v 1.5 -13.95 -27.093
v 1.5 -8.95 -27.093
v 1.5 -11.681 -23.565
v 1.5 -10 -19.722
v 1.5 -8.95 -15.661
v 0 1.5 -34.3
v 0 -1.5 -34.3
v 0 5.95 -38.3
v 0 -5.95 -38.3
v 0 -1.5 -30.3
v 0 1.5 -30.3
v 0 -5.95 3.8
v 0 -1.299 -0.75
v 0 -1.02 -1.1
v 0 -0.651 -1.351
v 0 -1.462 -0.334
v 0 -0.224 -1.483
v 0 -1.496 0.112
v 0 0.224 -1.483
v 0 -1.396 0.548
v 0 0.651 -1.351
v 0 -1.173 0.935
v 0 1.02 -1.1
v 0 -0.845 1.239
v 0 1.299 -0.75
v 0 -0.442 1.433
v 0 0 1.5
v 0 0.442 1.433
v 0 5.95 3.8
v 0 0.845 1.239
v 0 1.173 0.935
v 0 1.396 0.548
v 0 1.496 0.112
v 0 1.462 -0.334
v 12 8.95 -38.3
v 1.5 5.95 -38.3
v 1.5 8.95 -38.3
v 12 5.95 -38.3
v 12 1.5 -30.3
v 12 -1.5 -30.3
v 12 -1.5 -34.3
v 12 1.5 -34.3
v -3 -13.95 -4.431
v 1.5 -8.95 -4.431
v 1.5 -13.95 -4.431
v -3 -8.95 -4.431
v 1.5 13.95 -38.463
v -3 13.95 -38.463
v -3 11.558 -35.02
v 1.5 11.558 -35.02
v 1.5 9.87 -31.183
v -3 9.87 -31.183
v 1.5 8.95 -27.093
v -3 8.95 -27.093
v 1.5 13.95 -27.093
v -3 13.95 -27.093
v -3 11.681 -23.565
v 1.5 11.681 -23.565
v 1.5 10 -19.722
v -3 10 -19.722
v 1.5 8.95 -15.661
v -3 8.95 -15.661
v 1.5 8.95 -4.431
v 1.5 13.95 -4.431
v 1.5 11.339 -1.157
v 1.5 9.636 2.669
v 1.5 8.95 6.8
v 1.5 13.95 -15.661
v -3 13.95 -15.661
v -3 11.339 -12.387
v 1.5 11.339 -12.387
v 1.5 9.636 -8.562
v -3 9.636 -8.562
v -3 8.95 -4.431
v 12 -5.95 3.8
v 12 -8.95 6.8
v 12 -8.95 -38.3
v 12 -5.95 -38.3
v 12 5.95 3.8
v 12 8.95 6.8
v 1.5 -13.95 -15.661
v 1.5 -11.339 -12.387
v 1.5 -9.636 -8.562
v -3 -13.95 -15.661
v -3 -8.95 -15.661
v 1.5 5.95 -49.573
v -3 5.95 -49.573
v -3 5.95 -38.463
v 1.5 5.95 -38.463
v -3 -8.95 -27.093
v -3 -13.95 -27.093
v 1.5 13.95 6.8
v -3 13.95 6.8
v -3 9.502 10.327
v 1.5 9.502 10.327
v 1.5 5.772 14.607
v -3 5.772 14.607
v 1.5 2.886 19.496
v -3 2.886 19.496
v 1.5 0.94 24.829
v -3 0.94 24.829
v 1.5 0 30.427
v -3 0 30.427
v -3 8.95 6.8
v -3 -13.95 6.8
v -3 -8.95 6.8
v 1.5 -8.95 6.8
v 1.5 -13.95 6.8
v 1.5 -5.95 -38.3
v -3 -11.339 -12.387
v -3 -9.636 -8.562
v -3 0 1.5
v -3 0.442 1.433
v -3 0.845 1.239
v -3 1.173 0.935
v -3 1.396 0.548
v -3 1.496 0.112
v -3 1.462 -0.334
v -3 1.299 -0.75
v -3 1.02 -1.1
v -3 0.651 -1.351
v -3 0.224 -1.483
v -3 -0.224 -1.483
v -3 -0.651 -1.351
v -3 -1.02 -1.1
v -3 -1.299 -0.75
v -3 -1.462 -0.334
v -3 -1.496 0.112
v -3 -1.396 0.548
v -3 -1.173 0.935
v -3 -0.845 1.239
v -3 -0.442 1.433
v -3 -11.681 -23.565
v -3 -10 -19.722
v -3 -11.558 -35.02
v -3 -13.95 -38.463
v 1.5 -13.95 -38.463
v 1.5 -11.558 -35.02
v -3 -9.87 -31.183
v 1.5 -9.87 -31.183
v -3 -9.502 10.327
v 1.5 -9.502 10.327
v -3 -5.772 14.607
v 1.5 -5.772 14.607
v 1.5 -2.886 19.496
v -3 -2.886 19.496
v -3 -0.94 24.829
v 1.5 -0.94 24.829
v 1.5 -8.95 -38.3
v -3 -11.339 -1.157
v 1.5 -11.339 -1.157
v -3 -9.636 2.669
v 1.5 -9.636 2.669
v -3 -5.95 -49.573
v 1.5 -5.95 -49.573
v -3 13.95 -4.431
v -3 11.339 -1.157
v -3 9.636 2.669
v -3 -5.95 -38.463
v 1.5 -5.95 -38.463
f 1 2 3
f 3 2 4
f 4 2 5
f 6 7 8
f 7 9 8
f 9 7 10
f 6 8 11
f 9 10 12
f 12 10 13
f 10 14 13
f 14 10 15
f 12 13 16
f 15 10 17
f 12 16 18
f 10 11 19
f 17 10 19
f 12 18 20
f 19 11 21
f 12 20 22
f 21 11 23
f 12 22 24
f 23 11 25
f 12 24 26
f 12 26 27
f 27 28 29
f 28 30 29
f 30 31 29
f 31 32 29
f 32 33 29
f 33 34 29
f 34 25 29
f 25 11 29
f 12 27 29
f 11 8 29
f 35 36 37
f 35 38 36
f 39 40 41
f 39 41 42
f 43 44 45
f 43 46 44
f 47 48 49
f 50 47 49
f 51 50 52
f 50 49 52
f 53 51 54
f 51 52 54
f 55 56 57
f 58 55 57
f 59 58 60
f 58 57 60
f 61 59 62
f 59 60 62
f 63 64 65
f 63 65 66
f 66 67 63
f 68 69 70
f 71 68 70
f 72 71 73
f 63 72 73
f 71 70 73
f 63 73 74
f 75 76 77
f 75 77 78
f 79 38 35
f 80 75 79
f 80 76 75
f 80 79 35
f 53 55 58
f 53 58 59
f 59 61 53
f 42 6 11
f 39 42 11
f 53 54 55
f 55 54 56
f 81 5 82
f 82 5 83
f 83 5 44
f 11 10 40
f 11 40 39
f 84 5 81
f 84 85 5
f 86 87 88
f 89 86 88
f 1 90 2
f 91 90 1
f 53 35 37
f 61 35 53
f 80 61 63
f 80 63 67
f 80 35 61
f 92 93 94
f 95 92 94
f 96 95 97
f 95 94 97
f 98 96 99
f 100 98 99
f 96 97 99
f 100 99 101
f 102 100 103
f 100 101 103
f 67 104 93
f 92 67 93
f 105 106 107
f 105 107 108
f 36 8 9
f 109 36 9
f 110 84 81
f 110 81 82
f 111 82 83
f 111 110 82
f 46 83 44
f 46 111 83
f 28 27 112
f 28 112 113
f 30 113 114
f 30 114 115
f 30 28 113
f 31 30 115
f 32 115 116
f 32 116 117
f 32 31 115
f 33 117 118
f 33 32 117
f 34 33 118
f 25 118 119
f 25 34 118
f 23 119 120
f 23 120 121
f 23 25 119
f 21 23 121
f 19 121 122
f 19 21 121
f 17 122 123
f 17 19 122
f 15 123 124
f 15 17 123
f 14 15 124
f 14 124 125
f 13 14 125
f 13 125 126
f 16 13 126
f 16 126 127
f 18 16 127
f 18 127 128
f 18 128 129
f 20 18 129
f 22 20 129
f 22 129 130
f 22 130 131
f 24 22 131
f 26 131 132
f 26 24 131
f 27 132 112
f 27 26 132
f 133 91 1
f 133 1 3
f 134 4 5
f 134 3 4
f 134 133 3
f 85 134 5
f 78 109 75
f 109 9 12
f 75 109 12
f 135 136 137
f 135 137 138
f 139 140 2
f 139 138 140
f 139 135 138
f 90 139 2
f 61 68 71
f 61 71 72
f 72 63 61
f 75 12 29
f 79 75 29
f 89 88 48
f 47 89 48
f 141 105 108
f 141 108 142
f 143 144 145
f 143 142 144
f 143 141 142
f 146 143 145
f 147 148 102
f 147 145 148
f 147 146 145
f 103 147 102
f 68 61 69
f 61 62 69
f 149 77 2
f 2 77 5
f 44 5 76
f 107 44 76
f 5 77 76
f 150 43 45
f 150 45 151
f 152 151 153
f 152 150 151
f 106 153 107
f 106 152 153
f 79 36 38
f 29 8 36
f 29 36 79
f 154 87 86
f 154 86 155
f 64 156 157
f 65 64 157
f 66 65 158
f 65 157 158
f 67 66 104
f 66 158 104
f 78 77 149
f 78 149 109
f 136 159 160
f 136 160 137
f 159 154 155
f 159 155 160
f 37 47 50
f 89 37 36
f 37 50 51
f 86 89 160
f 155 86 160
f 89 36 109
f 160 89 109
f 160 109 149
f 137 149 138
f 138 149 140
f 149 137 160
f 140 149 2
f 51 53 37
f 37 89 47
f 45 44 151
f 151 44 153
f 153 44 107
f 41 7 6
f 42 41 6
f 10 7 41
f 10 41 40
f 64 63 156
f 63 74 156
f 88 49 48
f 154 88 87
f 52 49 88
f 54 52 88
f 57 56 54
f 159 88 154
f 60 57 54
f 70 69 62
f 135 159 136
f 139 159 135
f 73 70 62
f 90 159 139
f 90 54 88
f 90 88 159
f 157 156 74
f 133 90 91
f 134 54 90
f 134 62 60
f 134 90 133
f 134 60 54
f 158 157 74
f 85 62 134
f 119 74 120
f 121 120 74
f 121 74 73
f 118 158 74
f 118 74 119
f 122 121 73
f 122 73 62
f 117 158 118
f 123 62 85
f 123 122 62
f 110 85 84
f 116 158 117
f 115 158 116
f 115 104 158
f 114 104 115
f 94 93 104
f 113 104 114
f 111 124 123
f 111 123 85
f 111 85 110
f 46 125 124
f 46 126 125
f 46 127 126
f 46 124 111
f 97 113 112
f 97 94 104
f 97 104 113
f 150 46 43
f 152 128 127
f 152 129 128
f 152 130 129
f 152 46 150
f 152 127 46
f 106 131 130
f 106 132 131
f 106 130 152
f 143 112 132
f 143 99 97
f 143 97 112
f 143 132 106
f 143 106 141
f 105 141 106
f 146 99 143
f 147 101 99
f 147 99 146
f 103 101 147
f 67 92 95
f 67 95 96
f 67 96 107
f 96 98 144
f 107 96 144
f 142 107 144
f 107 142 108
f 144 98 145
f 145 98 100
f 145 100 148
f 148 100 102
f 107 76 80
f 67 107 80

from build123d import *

# Parameters (mm, degrees)
SKETCH1_W           = 3
SKETCH1_H           = 42.1
SKETCH1_H_2         = 4
BOSS_EXTRUDE1_DEPTH = 12
SKETCH3_W           = 45.1
SKETCH3_H           = 17.9
SKETCH3_R           = 1.5
BOSS_EXTRUDE2_DEPTH = 3
SKETCH5_W           = 17.9
SKETCH5_H           = 45.1
BOSS_EXTRUDE4_DEPTH = 4.5
CUT_EXTRUDE4_DEPTH  = 54.638254019


with BuildPart() as part:
    # Sketch1 → Boss-Extrude1 (new body)
    with BuildSketch(Plane.YZ):
        Polygon((-5.95, 3.8), (5.95, 3.8), (8.95, 3.8), (8.95, 6.8), (-8.95, 6.8), (-8.95, 3.8), align=None)
        with Locations((-7.45, -17.25)):
            Rectangle(SKETCH1_W, SKETCH1_H)
        with Locations((7.45, -17.25)):
            Rectangle(SKETCH1_W, SKETCH1_H)
        with Locations((0, -32.3)):
            Rectangle(SKETCH1_W, SKETCH1_H_2)
    extrude(amount=BOSS_EXTRUDE1_DEPTH)

    # Sketch3 → Boss-Extrude2 (add)
    with BuildSketch(Plane.ZY):
        with Locations((-15.75, 0)):
            Rectangle(SKETCH3_W, SKETCH3_H)
        Circle(SKETCH3_R, mode=Mode.SUBTRACT)
    extrude(amount=BOSS_EXTRUDE2_DEPTH)

    # Sketch5 → Boss-Extrude4 (add)
    with BuildSketch(Plane(origin=(-3, 0, 0), x_dir=(0, -1, 0), z_dir=(-1, 0, 0))):
        Polygon((-13.95, 21.583539772), (-13.95, -49.572772711), (13.95, -49.572772711), (13.95, 20.927227289), (13.95, 30.427227289), (-13.95, 30.427227289), align=None)
        with Locations((0, -15.75)):
            Rectangle(SKETCH5_W, SKETCH5_H, mode=Mode.SUBTRACT)
    extrude(amount=-BOSS_EXTRUDE4_DEPTH)

    # Sketch6 → Cut-Extrude4 (cut, symmetric)
    with BuildSketch(Plane(origin=(-3, 0, 0), x_dir=(0, -1, 0), z_dir=(-1, 0, 0))):
        with BuildLine():
            Line((-8.95, -4.430558852), (-13.95, -4.430558852))
            ThreePointArc((-13.95, -4.430558852), (-10.365862707, 0.702047669), (-8.95, 6.8))
            Line((-8.95, 6.8), (-13.95, 6.8))
            ThreePointArc((-13.95, 6.8), (-4.216827043, 16.985131712), (0, 30.427227289))
            Line((0, 30.427227289), (0, 38.207310194))
            Line((0, 38.207310194), (-27.495186948, 38.207310194))
            Line((-27.495186948, 38.207310194), (-27.495186948, -49.572772711))
            Line((-27.495186948, -49.572772711), (-5.95, -49.572772711))
            Line((-5.95, -49.572772711), (-5.95, -38.463062756))
            Line((-5.95, -38.463062756), (-13.95, -38.463062756))
            ThreePointArc((-13.95, -38.463062756), (-10.621066319, -33.1423359), (-8.95, -27.092586229))
            Line((-8.95, -27.092586229), (-13.95, -27.092586229))
            ThreePointArc((-13.95, -27.092586229), (-10.764093377, -21.676860063), (-8.95, -15.661117704))
            Line((-8.95, -15.661117704), (-13.95, -15.661117704))
            ThreePointArc((-13.95, -15.661117704), (-10.365862707, -10.528511183), (-8.95, -4.430558852))
        make_face()
    cut_extrude4 = extrude(amount=CUT_EXTRUDE4_DEPTH, both=True, mode=Mode.SUBTRACT)

    # Mirror1: Cut-Extrude4 across plane
    add(cut_extrude4.mirror(Plane.ZX), mode=Mode.SUBTRACT)


solid = part.part
